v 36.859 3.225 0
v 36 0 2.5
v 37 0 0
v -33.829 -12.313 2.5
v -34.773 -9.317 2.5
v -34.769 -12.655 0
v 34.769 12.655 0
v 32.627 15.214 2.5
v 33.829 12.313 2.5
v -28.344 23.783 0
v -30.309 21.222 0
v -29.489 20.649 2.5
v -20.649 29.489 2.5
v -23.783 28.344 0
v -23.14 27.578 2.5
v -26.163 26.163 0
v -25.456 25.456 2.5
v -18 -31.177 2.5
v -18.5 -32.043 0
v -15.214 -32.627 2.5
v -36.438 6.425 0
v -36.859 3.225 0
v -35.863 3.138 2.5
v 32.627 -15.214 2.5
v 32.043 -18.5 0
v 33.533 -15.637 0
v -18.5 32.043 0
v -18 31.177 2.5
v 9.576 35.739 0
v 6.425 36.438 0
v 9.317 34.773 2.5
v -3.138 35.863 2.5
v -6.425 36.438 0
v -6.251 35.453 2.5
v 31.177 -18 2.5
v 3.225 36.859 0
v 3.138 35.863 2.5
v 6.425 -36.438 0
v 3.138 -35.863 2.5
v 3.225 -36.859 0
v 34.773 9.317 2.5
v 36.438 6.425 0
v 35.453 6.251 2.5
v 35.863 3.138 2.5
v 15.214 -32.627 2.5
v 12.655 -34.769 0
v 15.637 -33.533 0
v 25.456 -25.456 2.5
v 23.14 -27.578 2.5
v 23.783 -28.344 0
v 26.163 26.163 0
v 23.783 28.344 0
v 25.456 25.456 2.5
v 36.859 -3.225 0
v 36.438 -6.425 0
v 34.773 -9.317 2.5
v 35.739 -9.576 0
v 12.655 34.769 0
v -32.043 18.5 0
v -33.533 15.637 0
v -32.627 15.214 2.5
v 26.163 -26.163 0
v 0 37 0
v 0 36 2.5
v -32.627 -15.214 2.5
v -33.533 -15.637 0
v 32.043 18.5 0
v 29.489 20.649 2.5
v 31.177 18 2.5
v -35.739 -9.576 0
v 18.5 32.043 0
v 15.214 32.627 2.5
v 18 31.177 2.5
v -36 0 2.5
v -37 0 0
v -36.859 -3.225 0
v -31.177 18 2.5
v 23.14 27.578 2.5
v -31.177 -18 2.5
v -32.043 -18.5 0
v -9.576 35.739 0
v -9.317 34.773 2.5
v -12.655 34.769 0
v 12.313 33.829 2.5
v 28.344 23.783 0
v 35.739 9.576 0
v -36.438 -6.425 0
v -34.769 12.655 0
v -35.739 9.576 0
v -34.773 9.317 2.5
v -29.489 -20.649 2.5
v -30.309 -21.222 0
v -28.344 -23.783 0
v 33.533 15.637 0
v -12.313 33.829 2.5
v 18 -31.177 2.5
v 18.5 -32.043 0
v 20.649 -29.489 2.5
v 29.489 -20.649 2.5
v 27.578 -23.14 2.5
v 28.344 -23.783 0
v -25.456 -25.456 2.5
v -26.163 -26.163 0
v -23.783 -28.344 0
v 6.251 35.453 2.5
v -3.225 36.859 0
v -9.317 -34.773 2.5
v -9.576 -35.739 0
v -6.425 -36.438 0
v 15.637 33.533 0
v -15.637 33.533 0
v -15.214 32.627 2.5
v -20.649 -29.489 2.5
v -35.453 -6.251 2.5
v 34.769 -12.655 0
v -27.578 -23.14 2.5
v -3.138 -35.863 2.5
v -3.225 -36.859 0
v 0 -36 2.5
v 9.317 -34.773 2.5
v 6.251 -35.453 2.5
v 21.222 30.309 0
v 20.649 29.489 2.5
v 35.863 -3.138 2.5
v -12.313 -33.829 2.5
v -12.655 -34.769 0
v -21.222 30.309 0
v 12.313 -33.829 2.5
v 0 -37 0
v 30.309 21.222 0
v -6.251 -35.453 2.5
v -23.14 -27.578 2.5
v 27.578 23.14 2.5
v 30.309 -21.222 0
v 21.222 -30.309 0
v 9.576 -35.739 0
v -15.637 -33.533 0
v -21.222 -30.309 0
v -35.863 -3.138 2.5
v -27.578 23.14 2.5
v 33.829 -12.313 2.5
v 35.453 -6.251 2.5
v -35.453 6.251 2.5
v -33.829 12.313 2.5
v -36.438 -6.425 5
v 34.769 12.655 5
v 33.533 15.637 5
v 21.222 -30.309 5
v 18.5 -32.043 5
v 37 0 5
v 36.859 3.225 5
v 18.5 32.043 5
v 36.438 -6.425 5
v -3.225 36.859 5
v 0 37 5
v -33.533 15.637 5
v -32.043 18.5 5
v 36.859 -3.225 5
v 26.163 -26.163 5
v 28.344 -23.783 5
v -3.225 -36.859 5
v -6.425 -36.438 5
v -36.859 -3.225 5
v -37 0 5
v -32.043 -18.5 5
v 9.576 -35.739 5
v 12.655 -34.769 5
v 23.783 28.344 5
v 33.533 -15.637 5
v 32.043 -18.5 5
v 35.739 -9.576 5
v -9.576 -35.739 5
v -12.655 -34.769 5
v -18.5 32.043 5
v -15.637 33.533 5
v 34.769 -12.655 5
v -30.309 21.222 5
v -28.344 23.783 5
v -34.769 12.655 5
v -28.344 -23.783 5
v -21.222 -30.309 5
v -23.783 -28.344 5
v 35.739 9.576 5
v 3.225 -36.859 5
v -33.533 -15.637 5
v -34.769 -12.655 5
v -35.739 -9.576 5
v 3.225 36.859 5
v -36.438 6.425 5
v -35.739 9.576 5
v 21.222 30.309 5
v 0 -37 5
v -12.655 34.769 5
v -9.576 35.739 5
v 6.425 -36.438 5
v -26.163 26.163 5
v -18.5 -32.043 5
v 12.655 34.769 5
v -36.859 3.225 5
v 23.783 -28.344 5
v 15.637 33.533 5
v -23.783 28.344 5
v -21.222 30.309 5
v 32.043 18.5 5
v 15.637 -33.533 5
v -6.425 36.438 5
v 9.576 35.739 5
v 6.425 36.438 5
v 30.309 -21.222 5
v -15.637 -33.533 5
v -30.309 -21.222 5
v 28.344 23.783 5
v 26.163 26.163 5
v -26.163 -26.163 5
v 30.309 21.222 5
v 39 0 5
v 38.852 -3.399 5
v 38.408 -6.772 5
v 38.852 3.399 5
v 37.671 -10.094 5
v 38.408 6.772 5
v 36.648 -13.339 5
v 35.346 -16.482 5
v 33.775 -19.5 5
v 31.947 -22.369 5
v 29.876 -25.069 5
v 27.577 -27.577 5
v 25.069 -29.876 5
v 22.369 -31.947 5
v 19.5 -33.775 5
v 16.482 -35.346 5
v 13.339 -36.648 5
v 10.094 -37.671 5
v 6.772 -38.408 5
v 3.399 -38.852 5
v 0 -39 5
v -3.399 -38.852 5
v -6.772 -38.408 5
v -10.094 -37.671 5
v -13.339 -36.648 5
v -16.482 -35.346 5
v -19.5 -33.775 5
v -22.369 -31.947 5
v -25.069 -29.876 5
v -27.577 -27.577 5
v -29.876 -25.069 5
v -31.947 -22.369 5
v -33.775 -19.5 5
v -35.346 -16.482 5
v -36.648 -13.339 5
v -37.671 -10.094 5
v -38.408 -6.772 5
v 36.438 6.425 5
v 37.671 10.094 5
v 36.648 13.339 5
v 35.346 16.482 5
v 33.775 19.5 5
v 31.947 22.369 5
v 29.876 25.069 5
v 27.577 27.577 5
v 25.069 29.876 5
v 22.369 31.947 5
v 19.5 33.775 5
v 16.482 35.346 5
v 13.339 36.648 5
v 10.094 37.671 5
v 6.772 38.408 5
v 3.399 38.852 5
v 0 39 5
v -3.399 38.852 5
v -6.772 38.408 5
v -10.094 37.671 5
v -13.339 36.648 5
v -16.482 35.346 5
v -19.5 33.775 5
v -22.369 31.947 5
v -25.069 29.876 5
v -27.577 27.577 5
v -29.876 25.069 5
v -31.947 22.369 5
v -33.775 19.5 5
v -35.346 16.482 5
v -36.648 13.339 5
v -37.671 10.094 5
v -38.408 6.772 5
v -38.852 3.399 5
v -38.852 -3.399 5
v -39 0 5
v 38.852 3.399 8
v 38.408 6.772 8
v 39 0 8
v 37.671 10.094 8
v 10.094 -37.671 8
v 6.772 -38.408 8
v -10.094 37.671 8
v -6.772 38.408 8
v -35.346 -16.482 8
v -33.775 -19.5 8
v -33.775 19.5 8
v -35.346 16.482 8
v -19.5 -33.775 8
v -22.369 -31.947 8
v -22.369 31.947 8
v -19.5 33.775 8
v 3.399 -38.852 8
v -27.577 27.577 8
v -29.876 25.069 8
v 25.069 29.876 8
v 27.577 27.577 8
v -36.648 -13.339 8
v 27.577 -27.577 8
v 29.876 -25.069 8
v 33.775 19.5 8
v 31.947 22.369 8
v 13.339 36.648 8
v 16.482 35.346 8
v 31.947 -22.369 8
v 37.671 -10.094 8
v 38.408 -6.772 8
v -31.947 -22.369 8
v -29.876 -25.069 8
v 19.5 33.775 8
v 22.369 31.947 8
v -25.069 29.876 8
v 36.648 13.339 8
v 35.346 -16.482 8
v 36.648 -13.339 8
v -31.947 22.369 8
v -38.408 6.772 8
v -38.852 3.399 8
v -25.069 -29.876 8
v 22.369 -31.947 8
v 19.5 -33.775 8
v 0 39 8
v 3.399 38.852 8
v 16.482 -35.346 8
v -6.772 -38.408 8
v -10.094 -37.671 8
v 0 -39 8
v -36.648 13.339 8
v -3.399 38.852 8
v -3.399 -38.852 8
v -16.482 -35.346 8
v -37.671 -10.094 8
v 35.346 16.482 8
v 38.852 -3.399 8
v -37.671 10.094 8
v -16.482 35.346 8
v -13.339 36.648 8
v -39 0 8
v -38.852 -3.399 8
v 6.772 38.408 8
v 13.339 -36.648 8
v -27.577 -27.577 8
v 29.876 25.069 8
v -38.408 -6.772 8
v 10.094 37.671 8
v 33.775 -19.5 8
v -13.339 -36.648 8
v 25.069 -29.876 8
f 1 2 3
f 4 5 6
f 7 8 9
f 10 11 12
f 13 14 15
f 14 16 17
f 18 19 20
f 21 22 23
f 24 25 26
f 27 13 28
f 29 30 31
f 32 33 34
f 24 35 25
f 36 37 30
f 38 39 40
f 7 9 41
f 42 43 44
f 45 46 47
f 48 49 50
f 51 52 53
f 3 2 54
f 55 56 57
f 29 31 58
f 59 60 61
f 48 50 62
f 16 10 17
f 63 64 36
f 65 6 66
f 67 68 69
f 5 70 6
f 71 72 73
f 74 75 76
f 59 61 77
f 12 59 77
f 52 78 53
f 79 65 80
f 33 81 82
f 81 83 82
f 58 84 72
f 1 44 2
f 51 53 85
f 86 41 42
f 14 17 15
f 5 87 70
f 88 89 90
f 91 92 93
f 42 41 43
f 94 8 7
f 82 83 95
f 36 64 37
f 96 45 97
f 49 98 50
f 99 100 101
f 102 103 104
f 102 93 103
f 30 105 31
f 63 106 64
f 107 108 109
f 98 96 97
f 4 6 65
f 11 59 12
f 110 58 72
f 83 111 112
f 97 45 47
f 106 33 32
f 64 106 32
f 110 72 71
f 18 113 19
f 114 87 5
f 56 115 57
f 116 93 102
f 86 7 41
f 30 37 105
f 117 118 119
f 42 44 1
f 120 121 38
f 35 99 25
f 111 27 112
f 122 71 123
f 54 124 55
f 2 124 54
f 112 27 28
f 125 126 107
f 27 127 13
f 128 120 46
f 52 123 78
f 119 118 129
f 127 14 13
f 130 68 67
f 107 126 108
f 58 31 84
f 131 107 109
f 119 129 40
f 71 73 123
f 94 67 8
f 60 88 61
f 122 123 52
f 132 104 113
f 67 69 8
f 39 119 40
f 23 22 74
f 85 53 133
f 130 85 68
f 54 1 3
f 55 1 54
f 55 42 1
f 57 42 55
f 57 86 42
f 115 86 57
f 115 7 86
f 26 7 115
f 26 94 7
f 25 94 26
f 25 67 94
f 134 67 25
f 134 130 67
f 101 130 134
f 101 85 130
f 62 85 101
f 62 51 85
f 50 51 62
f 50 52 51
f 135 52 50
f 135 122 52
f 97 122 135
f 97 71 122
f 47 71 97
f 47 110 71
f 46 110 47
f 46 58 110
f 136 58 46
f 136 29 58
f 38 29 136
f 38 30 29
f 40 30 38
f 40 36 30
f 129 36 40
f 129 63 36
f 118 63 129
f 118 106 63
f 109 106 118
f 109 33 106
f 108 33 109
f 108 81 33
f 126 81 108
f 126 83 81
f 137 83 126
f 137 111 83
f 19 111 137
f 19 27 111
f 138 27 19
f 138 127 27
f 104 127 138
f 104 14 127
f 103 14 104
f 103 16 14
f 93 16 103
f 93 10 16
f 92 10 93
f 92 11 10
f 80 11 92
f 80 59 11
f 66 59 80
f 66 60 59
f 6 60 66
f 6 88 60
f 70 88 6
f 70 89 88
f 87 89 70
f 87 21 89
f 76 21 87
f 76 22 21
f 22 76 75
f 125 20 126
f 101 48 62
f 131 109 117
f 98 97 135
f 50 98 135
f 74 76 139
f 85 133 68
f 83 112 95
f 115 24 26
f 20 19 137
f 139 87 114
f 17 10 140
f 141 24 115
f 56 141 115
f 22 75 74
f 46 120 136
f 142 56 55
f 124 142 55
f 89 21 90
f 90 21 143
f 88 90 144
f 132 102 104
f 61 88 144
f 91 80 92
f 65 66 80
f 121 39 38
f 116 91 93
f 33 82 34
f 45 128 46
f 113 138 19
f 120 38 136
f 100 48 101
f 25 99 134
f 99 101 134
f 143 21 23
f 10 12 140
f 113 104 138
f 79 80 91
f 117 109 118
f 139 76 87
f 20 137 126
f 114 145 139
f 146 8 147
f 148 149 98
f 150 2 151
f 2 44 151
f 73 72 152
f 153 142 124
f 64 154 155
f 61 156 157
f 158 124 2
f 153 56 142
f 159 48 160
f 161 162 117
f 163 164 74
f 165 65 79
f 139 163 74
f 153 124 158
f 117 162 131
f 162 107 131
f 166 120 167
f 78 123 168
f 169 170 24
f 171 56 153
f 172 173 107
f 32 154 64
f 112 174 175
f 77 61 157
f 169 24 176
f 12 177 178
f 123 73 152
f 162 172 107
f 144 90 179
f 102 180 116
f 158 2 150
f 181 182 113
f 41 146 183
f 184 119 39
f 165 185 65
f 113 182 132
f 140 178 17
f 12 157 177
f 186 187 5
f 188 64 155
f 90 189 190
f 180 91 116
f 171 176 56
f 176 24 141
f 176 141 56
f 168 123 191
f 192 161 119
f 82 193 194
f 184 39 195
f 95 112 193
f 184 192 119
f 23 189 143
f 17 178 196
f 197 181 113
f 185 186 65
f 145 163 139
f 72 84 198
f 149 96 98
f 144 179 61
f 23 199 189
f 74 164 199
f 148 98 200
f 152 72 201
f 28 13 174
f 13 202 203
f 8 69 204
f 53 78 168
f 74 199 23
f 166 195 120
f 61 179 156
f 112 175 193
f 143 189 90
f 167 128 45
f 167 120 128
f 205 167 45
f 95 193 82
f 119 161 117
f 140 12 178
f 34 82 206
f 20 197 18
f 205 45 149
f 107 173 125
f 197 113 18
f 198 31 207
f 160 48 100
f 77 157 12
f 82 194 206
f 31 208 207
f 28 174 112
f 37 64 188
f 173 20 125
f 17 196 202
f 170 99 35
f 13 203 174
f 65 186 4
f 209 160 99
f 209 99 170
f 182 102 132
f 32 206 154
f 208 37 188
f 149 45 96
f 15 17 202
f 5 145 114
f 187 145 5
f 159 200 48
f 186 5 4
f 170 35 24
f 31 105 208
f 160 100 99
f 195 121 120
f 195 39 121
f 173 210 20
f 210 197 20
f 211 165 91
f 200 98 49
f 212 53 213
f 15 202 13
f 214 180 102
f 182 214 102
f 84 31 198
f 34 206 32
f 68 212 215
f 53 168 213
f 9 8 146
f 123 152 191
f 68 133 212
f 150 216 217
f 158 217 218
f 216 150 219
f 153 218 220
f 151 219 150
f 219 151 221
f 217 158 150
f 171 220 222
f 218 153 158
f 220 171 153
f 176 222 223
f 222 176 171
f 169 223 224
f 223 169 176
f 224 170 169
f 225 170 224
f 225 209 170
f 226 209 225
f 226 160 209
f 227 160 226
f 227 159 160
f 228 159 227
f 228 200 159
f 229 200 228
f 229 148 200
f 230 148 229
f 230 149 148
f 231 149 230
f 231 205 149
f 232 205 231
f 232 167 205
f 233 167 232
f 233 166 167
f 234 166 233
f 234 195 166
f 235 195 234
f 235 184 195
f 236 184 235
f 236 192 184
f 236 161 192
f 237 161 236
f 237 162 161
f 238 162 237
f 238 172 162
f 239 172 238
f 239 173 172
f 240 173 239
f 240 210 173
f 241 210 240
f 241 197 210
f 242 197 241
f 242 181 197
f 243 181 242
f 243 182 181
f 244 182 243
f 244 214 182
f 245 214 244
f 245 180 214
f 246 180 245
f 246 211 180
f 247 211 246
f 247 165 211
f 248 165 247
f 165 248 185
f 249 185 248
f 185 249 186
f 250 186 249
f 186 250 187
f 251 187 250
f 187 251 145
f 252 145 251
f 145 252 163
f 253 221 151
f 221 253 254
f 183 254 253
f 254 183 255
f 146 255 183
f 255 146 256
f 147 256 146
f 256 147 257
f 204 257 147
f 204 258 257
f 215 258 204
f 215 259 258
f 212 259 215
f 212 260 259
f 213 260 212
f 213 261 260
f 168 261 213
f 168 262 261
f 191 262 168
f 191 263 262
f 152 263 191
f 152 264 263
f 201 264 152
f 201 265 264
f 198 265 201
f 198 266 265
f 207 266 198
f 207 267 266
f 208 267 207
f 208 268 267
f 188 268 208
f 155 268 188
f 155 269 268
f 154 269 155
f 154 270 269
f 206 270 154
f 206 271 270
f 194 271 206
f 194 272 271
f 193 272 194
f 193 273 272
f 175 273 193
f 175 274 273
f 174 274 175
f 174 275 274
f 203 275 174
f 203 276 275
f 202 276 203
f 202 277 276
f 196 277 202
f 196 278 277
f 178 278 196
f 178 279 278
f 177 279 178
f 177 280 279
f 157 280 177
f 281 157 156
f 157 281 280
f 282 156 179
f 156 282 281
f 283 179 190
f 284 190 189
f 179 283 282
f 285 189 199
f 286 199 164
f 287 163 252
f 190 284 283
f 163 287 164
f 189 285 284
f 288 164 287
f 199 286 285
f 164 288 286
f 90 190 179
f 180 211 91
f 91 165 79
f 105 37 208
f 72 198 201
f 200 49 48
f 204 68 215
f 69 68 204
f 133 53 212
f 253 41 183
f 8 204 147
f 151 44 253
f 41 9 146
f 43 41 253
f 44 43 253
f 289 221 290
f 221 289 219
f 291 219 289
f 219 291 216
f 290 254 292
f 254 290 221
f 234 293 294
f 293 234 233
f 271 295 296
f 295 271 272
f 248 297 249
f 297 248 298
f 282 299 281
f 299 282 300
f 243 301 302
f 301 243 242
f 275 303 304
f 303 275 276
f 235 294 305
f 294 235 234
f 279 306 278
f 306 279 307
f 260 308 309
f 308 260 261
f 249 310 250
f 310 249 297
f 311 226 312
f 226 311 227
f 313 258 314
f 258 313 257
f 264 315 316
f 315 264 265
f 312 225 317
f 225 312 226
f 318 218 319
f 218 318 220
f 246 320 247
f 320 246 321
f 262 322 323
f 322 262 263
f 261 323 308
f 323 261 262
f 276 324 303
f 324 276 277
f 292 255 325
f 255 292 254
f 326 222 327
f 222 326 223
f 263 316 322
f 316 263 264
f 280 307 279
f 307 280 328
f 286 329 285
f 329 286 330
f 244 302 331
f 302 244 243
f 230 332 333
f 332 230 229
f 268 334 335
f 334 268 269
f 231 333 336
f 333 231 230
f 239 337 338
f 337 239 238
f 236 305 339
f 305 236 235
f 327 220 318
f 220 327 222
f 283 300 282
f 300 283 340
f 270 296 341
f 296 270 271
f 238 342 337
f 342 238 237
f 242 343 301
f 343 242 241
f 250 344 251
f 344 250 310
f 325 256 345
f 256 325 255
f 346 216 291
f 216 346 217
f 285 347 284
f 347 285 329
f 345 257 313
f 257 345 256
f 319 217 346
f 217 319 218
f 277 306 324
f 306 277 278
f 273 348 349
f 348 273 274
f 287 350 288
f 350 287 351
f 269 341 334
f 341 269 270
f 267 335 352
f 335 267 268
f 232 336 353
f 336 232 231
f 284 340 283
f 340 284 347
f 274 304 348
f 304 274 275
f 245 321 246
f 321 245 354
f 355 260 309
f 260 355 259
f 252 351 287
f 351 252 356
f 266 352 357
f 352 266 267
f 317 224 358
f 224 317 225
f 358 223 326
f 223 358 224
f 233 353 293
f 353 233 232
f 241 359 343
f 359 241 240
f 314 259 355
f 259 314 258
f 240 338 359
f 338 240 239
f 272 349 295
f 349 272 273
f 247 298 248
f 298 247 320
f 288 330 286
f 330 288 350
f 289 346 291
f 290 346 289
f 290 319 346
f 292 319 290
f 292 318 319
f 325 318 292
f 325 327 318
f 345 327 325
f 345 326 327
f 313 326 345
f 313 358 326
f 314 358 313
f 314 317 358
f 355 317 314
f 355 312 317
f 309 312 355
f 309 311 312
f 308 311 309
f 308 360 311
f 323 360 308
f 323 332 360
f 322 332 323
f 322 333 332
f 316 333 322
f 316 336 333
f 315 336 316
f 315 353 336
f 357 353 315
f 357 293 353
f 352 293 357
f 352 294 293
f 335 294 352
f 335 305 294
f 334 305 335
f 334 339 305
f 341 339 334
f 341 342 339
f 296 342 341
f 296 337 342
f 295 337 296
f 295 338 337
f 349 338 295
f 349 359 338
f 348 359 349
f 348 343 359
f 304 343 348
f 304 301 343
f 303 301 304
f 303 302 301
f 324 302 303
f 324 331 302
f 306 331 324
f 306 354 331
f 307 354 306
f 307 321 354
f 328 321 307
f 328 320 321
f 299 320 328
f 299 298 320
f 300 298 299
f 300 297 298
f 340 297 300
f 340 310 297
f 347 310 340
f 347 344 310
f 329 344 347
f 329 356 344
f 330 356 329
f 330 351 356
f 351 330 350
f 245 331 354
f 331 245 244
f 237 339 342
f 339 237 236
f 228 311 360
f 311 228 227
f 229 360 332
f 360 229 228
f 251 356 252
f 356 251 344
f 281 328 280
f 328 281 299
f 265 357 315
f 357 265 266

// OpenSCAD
$fn=72;
cylinder(h=2.5,r1=74/2,r2=72/2);
translate([0,0,2.5])cylinder(h=2.5,r1=72/2,r2=74/2);
translate([0,0,5])cylinder(h=3,r=78/2);
